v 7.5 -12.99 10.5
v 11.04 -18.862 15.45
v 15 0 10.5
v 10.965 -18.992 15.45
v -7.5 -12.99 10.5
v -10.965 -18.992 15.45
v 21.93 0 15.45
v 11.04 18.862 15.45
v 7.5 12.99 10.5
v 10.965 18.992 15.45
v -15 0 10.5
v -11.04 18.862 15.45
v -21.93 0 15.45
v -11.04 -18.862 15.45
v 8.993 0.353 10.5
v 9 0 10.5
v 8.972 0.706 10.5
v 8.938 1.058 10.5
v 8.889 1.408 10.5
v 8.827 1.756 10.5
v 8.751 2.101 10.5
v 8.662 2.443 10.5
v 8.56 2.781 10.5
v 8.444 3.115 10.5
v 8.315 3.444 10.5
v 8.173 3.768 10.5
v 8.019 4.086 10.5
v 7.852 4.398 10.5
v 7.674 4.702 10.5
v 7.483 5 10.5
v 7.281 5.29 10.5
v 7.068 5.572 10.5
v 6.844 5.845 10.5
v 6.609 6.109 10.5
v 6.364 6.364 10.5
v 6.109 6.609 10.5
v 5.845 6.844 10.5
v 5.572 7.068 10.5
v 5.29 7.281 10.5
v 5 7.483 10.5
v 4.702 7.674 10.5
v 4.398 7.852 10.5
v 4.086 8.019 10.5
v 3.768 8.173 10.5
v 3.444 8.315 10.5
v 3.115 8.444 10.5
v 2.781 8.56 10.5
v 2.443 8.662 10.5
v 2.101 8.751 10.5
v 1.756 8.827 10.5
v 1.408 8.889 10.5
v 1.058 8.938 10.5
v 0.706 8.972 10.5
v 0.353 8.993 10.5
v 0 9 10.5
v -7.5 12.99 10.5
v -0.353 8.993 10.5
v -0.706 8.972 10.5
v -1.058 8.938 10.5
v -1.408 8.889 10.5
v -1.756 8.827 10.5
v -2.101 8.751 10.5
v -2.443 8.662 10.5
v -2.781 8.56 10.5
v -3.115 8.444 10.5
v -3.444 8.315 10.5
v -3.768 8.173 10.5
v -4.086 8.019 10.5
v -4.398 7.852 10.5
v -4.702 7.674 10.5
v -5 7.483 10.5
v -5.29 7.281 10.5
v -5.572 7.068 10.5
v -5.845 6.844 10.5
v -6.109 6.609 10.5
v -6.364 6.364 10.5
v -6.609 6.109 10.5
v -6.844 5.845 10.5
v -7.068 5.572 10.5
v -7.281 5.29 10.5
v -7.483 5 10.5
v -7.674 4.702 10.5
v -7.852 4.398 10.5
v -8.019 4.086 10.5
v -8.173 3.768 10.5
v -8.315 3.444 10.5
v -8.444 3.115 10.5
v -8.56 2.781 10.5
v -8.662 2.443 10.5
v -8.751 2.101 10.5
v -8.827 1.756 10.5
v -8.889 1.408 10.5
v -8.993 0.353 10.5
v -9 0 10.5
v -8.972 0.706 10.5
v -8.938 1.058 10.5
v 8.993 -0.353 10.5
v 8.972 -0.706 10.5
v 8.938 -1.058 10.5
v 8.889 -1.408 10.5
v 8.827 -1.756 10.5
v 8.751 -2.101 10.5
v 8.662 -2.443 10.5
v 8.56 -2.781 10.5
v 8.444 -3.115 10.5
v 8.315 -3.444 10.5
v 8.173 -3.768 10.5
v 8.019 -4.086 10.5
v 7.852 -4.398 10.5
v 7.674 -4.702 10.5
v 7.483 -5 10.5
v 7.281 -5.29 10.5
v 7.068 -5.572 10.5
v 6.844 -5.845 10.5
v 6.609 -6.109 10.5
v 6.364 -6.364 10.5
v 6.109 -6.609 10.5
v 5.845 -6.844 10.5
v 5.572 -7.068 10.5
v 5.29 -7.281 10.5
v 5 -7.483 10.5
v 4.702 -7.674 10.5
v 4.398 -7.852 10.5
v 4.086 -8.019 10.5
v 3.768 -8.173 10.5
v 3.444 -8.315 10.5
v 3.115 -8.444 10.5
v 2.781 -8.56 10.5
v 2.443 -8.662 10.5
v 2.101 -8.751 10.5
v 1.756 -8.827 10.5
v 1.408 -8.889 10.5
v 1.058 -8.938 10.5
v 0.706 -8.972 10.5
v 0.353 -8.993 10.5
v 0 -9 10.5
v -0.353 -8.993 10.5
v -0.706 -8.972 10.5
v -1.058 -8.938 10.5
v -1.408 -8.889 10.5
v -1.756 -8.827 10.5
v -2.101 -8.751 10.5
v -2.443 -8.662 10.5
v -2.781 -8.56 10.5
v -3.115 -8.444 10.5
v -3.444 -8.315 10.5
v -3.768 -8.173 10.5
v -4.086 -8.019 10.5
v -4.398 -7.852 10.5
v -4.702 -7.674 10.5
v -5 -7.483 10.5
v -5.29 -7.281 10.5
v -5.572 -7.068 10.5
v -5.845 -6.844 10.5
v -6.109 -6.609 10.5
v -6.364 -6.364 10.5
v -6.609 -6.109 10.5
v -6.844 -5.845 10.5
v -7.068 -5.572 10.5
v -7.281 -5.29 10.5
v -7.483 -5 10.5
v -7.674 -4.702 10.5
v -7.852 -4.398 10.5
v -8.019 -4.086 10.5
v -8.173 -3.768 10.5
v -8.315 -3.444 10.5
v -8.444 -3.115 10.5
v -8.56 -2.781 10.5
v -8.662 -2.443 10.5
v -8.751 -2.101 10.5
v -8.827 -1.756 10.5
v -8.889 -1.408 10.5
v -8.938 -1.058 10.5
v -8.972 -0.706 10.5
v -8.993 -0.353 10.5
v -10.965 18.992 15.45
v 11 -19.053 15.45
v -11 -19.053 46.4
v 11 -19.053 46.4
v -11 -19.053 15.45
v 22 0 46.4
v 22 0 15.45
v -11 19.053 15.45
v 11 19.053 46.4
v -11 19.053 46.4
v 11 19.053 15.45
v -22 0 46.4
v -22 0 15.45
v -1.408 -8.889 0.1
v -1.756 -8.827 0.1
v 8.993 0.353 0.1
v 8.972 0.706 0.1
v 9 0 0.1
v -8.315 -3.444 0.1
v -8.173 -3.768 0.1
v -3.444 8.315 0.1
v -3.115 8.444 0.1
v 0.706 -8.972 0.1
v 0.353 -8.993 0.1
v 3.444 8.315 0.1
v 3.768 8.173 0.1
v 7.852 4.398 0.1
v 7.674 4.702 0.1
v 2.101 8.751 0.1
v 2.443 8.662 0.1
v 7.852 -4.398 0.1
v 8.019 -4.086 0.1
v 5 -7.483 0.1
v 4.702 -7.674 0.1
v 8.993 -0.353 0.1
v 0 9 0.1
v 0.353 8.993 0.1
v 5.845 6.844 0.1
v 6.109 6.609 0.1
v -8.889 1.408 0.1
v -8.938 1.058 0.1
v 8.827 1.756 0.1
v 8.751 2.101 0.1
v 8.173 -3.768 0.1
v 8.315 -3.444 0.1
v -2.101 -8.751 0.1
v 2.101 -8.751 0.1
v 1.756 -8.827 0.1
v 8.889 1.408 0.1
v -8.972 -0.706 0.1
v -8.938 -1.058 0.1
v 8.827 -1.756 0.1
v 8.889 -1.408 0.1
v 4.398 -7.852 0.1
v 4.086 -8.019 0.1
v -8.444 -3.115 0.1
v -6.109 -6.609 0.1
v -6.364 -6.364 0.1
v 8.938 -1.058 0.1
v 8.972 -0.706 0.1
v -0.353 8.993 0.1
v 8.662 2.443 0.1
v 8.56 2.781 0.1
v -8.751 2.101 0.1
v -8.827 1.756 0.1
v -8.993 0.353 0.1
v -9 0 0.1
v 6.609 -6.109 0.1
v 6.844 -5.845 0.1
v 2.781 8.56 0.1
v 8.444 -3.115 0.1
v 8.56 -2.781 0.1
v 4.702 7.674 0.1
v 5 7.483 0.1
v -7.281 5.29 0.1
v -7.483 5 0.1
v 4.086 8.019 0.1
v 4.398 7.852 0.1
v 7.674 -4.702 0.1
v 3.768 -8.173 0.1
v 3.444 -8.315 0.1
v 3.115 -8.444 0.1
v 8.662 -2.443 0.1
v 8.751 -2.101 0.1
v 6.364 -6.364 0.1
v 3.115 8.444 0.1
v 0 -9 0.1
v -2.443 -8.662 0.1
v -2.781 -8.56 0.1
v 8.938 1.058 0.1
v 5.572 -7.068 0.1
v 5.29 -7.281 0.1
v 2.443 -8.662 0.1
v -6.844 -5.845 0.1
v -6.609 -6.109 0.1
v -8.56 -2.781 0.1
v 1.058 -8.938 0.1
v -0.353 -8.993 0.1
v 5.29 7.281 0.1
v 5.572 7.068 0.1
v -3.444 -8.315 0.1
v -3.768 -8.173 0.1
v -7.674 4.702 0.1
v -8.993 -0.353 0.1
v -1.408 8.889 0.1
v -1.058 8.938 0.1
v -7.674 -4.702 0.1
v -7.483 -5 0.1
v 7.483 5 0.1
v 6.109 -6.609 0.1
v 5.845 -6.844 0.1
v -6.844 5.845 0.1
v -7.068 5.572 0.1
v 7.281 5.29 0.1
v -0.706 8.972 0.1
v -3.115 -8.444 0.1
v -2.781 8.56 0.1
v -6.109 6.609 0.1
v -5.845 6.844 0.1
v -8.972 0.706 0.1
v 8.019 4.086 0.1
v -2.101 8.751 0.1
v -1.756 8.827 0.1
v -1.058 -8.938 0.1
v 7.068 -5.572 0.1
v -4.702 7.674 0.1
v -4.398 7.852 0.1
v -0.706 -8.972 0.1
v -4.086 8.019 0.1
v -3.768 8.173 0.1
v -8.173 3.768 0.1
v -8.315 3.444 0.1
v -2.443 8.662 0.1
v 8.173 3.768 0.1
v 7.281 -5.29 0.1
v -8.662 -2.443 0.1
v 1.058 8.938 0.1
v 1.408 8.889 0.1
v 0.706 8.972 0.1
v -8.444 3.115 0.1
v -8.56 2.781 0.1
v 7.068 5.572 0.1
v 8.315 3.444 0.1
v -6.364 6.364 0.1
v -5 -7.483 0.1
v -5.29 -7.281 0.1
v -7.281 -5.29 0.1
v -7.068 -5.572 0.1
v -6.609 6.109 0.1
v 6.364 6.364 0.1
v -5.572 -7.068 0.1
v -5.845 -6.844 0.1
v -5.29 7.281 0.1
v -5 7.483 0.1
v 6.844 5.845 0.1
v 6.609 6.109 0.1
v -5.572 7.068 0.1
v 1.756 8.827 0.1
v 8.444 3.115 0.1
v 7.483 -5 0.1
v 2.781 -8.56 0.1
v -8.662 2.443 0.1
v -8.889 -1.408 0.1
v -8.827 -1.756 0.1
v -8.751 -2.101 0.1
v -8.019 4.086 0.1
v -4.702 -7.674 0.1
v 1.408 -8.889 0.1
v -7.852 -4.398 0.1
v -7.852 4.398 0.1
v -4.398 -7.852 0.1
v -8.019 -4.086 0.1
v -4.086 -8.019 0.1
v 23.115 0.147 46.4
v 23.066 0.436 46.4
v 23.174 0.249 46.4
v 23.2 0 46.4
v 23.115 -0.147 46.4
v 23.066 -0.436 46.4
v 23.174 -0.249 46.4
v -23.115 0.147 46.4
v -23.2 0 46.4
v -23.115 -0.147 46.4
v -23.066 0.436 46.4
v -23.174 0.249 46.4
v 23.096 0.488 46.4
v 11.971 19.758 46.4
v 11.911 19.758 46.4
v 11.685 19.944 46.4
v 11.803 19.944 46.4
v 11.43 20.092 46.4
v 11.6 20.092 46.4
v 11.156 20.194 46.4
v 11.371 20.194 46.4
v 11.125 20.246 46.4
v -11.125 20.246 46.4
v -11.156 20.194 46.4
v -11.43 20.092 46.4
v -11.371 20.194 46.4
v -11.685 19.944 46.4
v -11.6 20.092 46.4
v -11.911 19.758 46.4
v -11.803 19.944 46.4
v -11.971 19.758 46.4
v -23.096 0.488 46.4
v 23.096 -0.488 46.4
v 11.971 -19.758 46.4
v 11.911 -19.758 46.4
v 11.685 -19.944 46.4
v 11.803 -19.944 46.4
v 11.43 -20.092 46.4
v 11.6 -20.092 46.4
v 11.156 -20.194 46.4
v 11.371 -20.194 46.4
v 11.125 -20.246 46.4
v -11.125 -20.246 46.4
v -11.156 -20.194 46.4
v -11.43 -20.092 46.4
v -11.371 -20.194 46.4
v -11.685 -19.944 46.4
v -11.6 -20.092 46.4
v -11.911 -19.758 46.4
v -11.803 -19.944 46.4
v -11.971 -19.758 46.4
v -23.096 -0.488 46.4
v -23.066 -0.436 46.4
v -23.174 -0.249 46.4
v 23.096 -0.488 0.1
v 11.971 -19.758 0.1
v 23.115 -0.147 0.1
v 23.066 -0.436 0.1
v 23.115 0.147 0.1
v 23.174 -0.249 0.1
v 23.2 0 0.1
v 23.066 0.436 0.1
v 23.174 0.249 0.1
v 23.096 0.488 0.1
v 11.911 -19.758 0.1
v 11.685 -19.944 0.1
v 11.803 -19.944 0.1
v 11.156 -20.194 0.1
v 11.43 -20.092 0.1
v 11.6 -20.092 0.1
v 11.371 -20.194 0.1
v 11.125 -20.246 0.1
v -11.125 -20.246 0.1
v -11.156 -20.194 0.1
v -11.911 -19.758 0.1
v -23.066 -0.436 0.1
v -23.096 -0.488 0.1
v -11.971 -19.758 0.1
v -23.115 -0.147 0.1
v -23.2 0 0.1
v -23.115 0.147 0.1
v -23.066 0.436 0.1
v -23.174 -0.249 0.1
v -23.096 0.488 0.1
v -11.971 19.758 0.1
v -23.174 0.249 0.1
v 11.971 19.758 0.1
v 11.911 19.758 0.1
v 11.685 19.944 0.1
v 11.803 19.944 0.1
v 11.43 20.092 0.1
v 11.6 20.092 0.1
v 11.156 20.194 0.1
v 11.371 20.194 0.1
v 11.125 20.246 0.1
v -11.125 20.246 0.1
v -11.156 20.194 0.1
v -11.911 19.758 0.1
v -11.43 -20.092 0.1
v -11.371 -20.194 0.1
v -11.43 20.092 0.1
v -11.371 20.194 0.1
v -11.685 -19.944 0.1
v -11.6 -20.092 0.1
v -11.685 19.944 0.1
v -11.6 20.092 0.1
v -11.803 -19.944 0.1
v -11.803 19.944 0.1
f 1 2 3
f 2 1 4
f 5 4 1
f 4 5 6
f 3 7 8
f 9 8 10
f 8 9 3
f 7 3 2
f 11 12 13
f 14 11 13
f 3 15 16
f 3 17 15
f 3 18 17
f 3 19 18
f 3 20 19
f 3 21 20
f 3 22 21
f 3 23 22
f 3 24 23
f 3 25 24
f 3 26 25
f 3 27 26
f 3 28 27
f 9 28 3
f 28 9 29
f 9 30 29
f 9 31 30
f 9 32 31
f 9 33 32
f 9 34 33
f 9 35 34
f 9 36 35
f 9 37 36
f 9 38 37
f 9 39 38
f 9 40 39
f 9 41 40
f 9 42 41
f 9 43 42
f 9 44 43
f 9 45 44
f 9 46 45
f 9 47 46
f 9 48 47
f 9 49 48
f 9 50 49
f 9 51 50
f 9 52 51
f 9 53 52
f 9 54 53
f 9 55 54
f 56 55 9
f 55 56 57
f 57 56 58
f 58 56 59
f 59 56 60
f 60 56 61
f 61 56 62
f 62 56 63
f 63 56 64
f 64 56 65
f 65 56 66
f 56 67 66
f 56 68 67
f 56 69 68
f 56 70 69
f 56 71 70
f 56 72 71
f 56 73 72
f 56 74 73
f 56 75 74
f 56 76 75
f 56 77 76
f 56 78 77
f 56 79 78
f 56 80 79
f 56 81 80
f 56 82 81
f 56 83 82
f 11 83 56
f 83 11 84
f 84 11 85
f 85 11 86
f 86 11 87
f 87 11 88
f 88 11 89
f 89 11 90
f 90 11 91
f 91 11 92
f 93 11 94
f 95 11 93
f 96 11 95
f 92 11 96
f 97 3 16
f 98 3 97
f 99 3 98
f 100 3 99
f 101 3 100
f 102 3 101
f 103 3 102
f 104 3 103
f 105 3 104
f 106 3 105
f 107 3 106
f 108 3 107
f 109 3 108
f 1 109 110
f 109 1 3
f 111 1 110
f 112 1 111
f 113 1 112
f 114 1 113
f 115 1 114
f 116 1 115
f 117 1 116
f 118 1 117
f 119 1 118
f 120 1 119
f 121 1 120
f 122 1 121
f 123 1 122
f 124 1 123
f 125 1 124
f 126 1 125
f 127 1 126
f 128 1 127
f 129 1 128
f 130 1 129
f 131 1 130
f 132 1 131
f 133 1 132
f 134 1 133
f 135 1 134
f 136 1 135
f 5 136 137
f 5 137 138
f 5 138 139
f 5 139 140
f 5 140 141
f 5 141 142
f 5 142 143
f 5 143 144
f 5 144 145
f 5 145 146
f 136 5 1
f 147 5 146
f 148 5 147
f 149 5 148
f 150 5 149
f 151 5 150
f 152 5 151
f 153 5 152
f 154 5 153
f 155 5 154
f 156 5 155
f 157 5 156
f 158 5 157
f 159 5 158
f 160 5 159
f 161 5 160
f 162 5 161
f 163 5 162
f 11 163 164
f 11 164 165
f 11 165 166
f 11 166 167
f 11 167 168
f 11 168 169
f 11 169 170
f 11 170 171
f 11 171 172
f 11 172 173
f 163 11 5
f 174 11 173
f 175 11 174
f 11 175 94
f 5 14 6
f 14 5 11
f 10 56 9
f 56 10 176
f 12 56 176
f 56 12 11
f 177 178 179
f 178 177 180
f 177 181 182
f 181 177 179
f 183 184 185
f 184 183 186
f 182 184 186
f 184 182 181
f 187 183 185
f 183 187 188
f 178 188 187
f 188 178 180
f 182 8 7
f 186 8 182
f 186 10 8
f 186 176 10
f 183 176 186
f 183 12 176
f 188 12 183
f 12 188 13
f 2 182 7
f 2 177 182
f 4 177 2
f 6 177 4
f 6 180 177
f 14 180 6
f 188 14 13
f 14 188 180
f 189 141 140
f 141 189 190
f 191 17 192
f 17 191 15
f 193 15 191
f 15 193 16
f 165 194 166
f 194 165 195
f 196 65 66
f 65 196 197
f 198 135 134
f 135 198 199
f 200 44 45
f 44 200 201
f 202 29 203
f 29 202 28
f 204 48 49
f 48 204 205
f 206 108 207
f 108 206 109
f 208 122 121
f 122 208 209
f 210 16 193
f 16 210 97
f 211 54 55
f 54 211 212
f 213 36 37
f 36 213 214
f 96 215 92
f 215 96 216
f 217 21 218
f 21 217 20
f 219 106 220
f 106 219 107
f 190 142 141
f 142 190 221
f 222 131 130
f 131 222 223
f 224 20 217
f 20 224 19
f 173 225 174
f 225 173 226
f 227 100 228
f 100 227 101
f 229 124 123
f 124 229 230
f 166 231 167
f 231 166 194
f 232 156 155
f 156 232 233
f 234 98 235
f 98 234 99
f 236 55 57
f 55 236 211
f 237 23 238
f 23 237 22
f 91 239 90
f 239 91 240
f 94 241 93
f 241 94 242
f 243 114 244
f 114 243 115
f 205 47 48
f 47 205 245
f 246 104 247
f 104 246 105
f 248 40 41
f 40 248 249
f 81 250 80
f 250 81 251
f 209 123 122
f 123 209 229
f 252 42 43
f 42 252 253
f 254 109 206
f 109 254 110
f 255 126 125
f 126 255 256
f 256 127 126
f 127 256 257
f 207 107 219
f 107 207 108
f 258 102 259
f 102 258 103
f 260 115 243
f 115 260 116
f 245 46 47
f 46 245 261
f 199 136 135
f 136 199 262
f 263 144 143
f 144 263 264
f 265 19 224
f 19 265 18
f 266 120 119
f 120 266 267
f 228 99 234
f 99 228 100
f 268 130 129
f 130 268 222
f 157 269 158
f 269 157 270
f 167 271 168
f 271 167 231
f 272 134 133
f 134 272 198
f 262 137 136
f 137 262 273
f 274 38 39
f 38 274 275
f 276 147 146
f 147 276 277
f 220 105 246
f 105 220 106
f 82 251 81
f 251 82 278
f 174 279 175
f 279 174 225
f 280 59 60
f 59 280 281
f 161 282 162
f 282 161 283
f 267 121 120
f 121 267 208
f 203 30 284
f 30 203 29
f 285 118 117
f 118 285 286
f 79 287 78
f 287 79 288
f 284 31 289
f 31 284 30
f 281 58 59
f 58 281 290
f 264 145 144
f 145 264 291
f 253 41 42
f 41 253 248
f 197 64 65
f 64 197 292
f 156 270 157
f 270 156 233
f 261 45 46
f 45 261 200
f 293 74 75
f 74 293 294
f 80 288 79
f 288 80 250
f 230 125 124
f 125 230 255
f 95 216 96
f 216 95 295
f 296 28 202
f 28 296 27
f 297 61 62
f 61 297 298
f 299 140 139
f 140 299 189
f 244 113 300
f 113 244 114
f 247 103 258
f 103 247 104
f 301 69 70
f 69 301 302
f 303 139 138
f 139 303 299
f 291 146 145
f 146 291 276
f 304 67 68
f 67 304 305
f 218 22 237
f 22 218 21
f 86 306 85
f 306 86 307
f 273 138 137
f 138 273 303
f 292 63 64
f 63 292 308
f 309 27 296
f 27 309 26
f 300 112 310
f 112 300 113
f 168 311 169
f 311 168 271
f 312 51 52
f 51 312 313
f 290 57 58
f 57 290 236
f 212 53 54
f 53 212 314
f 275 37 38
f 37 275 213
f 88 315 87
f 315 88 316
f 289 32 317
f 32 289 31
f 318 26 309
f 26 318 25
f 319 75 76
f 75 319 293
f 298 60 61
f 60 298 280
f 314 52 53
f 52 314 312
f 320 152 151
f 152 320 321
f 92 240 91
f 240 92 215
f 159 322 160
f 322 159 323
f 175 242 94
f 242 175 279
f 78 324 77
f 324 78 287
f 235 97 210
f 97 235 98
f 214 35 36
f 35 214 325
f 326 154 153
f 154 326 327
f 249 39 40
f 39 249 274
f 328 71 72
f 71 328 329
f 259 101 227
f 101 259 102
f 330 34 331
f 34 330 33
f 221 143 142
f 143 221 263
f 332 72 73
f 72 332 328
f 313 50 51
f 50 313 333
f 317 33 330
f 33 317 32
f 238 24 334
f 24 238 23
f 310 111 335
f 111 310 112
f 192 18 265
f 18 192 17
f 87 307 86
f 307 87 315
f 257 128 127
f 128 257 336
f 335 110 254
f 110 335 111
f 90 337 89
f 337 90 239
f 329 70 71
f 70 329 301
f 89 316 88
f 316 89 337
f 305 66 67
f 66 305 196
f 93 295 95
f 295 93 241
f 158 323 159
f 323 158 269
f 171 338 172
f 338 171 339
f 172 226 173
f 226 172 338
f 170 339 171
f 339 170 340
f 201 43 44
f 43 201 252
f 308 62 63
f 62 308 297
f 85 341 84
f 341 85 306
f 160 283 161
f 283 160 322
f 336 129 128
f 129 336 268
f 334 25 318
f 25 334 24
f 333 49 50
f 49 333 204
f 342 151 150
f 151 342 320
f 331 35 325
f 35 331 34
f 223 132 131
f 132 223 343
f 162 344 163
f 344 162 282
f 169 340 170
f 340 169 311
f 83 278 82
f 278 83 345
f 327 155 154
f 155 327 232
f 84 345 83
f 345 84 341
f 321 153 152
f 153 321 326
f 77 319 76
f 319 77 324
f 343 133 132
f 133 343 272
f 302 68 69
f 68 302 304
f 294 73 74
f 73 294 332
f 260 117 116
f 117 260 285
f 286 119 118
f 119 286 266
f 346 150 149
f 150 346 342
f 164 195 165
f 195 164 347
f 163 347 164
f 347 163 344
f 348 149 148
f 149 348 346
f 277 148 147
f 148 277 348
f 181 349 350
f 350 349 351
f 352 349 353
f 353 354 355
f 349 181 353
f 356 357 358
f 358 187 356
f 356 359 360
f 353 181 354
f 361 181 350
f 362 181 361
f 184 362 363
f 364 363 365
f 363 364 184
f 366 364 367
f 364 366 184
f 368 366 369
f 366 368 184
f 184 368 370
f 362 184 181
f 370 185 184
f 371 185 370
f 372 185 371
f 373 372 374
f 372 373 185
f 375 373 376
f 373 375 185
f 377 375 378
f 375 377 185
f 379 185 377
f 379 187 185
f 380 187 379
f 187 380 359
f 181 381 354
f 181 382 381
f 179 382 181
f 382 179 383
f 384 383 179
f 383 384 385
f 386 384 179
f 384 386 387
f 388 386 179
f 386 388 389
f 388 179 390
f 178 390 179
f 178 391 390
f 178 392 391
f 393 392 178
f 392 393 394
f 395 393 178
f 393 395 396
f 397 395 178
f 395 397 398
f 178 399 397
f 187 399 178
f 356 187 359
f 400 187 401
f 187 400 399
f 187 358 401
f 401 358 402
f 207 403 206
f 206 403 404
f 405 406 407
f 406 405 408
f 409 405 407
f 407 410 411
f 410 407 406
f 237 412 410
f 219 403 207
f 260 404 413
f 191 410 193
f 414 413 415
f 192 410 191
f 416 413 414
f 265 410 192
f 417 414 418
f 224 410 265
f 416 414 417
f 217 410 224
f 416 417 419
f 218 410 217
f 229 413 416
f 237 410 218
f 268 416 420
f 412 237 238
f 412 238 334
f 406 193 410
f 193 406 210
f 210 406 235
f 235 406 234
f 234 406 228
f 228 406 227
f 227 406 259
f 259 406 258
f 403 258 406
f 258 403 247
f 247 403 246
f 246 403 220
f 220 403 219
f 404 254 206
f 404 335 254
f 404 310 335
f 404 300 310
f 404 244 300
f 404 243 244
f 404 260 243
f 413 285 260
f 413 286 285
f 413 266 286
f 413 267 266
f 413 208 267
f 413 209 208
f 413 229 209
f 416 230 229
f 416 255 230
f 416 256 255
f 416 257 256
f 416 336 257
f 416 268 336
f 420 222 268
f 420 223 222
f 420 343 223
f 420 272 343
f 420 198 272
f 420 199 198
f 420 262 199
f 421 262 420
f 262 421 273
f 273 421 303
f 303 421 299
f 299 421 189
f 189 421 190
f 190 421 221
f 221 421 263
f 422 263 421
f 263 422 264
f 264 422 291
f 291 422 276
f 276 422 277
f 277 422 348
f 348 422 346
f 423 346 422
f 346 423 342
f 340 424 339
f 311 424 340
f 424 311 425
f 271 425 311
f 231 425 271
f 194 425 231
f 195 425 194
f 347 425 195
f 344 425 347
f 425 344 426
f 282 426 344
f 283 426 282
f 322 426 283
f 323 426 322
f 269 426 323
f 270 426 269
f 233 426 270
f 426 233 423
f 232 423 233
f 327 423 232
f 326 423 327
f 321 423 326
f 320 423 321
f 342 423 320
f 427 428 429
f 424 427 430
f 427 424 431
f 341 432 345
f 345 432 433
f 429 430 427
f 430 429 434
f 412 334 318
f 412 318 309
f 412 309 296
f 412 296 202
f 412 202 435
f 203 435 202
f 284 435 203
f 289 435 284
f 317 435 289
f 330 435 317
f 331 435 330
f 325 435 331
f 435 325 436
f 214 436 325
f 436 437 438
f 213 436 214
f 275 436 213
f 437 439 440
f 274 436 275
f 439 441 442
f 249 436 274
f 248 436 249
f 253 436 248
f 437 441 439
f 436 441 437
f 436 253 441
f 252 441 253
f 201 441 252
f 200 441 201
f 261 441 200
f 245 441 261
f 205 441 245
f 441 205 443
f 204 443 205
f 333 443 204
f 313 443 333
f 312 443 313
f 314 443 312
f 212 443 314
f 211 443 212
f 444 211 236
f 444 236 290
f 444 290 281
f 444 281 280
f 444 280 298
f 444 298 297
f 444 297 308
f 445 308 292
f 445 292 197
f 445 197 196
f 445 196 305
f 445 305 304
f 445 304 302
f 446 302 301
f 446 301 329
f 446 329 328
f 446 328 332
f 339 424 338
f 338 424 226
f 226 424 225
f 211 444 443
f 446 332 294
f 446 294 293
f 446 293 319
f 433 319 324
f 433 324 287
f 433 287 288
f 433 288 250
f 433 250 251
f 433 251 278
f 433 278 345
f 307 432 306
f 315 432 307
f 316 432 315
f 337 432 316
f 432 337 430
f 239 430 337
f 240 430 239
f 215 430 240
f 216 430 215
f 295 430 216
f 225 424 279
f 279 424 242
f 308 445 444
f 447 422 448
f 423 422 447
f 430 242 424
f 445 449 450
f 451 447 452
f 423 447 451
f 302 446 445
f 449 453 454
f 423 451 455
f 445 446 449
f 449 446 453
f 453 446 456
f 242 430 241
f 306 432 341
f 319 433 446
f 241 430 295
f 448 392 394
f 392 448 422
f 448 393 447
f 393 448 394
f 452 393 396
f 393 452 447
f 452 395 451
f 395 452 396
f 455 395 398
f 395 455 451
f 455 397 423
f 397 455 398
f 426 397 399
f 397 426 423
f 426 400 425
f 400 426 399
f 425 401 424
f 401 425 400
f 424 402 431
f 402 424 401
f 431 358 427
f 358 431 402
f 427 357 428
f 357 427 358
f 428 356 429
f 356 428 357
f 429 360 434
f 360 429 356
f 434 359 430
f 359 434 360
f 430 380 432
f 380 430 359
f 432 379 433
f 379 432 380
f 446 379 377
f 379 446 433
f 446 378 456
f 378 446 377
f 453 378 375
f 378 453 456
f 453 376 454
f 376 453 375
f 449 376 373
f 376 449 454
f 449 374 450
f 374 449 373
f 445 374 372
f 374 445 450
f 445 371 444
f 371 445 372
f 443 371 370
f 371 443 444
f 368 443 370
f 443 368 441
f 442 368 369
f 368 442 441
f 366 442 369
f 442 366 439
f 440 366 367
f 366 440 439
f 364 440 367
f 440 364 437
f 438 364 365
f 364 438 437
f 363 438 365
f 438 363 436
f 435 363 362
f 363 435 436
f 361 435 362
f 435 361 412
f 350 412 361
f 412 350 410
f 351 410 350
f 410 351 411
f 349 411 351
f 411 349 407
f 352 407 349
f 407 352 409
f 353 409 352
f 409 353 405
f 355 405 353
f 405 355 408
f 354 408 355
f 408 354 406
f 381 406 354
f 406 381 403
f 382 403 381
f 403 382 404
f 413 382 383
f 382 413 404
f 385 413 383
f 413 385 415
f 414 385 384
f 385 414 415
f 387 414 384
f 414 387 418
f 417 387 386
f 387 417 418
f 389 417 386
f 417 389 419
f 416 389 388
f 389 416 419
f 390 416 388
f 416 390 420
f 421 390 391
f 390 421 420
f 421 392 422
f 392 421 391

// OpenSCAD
/* tie-defender-bin.scad
 *
 * Copyright (C) Robert B. Ross, 2016
 *
 * This software is released under the Creative Commons
 * Attribution-ShareAlike 4.0 International Public License.
 */


include <./bintools.scad>

$fn=160;

/* locations is a pair of triples, translate : rotate pairs
 */
locations = [[[3,-19,0], [0,0,0]],
              [[-3,19,0],[0,0,0]]];
binHeight   = 46.5;

// harborFreightMediumFullHt(locations,inset=0.5) defenderBlank();

// defenderBlank();
defenderOutline();

/* defenderOutline() -- test piece for outline
 */
module defenderOutline() {
   translate([0,0,binHeight]) rotate([180,0,0]) {
      blankCutout(height=binHeight - 0.1, outlineScale=1.2) defenderBlank();
   }
}

module defenderBlank() {
   defenderHeight = 36; // total height of the defender

   rotate([180,0,0]) translate([0,0,-1*defenderHeight]) union() {
      /* basic hexagonal space to surround ship */
      cylinder($fn=6,r1=15,r2=22,h=5);
      translate([0,0,5-0.05]) cylinder($fn=6,r=22,h=defenderHeight-5+0.05);

      /* create additional empty space below the ship */
      translate([0,0,defenderHeight-binHeight])
         cylinder(r=9,h=binHeight-defenderHeight+0.1);
   } /* rotate and translate */
}

/*
 * Local variables:
 *  mode: C
 *  c-indent-level: 3
 *  c-basic-offset: 3
 * End:
 *
 * vim: ts=8 sts=3 sw=3 expandtab
 */
